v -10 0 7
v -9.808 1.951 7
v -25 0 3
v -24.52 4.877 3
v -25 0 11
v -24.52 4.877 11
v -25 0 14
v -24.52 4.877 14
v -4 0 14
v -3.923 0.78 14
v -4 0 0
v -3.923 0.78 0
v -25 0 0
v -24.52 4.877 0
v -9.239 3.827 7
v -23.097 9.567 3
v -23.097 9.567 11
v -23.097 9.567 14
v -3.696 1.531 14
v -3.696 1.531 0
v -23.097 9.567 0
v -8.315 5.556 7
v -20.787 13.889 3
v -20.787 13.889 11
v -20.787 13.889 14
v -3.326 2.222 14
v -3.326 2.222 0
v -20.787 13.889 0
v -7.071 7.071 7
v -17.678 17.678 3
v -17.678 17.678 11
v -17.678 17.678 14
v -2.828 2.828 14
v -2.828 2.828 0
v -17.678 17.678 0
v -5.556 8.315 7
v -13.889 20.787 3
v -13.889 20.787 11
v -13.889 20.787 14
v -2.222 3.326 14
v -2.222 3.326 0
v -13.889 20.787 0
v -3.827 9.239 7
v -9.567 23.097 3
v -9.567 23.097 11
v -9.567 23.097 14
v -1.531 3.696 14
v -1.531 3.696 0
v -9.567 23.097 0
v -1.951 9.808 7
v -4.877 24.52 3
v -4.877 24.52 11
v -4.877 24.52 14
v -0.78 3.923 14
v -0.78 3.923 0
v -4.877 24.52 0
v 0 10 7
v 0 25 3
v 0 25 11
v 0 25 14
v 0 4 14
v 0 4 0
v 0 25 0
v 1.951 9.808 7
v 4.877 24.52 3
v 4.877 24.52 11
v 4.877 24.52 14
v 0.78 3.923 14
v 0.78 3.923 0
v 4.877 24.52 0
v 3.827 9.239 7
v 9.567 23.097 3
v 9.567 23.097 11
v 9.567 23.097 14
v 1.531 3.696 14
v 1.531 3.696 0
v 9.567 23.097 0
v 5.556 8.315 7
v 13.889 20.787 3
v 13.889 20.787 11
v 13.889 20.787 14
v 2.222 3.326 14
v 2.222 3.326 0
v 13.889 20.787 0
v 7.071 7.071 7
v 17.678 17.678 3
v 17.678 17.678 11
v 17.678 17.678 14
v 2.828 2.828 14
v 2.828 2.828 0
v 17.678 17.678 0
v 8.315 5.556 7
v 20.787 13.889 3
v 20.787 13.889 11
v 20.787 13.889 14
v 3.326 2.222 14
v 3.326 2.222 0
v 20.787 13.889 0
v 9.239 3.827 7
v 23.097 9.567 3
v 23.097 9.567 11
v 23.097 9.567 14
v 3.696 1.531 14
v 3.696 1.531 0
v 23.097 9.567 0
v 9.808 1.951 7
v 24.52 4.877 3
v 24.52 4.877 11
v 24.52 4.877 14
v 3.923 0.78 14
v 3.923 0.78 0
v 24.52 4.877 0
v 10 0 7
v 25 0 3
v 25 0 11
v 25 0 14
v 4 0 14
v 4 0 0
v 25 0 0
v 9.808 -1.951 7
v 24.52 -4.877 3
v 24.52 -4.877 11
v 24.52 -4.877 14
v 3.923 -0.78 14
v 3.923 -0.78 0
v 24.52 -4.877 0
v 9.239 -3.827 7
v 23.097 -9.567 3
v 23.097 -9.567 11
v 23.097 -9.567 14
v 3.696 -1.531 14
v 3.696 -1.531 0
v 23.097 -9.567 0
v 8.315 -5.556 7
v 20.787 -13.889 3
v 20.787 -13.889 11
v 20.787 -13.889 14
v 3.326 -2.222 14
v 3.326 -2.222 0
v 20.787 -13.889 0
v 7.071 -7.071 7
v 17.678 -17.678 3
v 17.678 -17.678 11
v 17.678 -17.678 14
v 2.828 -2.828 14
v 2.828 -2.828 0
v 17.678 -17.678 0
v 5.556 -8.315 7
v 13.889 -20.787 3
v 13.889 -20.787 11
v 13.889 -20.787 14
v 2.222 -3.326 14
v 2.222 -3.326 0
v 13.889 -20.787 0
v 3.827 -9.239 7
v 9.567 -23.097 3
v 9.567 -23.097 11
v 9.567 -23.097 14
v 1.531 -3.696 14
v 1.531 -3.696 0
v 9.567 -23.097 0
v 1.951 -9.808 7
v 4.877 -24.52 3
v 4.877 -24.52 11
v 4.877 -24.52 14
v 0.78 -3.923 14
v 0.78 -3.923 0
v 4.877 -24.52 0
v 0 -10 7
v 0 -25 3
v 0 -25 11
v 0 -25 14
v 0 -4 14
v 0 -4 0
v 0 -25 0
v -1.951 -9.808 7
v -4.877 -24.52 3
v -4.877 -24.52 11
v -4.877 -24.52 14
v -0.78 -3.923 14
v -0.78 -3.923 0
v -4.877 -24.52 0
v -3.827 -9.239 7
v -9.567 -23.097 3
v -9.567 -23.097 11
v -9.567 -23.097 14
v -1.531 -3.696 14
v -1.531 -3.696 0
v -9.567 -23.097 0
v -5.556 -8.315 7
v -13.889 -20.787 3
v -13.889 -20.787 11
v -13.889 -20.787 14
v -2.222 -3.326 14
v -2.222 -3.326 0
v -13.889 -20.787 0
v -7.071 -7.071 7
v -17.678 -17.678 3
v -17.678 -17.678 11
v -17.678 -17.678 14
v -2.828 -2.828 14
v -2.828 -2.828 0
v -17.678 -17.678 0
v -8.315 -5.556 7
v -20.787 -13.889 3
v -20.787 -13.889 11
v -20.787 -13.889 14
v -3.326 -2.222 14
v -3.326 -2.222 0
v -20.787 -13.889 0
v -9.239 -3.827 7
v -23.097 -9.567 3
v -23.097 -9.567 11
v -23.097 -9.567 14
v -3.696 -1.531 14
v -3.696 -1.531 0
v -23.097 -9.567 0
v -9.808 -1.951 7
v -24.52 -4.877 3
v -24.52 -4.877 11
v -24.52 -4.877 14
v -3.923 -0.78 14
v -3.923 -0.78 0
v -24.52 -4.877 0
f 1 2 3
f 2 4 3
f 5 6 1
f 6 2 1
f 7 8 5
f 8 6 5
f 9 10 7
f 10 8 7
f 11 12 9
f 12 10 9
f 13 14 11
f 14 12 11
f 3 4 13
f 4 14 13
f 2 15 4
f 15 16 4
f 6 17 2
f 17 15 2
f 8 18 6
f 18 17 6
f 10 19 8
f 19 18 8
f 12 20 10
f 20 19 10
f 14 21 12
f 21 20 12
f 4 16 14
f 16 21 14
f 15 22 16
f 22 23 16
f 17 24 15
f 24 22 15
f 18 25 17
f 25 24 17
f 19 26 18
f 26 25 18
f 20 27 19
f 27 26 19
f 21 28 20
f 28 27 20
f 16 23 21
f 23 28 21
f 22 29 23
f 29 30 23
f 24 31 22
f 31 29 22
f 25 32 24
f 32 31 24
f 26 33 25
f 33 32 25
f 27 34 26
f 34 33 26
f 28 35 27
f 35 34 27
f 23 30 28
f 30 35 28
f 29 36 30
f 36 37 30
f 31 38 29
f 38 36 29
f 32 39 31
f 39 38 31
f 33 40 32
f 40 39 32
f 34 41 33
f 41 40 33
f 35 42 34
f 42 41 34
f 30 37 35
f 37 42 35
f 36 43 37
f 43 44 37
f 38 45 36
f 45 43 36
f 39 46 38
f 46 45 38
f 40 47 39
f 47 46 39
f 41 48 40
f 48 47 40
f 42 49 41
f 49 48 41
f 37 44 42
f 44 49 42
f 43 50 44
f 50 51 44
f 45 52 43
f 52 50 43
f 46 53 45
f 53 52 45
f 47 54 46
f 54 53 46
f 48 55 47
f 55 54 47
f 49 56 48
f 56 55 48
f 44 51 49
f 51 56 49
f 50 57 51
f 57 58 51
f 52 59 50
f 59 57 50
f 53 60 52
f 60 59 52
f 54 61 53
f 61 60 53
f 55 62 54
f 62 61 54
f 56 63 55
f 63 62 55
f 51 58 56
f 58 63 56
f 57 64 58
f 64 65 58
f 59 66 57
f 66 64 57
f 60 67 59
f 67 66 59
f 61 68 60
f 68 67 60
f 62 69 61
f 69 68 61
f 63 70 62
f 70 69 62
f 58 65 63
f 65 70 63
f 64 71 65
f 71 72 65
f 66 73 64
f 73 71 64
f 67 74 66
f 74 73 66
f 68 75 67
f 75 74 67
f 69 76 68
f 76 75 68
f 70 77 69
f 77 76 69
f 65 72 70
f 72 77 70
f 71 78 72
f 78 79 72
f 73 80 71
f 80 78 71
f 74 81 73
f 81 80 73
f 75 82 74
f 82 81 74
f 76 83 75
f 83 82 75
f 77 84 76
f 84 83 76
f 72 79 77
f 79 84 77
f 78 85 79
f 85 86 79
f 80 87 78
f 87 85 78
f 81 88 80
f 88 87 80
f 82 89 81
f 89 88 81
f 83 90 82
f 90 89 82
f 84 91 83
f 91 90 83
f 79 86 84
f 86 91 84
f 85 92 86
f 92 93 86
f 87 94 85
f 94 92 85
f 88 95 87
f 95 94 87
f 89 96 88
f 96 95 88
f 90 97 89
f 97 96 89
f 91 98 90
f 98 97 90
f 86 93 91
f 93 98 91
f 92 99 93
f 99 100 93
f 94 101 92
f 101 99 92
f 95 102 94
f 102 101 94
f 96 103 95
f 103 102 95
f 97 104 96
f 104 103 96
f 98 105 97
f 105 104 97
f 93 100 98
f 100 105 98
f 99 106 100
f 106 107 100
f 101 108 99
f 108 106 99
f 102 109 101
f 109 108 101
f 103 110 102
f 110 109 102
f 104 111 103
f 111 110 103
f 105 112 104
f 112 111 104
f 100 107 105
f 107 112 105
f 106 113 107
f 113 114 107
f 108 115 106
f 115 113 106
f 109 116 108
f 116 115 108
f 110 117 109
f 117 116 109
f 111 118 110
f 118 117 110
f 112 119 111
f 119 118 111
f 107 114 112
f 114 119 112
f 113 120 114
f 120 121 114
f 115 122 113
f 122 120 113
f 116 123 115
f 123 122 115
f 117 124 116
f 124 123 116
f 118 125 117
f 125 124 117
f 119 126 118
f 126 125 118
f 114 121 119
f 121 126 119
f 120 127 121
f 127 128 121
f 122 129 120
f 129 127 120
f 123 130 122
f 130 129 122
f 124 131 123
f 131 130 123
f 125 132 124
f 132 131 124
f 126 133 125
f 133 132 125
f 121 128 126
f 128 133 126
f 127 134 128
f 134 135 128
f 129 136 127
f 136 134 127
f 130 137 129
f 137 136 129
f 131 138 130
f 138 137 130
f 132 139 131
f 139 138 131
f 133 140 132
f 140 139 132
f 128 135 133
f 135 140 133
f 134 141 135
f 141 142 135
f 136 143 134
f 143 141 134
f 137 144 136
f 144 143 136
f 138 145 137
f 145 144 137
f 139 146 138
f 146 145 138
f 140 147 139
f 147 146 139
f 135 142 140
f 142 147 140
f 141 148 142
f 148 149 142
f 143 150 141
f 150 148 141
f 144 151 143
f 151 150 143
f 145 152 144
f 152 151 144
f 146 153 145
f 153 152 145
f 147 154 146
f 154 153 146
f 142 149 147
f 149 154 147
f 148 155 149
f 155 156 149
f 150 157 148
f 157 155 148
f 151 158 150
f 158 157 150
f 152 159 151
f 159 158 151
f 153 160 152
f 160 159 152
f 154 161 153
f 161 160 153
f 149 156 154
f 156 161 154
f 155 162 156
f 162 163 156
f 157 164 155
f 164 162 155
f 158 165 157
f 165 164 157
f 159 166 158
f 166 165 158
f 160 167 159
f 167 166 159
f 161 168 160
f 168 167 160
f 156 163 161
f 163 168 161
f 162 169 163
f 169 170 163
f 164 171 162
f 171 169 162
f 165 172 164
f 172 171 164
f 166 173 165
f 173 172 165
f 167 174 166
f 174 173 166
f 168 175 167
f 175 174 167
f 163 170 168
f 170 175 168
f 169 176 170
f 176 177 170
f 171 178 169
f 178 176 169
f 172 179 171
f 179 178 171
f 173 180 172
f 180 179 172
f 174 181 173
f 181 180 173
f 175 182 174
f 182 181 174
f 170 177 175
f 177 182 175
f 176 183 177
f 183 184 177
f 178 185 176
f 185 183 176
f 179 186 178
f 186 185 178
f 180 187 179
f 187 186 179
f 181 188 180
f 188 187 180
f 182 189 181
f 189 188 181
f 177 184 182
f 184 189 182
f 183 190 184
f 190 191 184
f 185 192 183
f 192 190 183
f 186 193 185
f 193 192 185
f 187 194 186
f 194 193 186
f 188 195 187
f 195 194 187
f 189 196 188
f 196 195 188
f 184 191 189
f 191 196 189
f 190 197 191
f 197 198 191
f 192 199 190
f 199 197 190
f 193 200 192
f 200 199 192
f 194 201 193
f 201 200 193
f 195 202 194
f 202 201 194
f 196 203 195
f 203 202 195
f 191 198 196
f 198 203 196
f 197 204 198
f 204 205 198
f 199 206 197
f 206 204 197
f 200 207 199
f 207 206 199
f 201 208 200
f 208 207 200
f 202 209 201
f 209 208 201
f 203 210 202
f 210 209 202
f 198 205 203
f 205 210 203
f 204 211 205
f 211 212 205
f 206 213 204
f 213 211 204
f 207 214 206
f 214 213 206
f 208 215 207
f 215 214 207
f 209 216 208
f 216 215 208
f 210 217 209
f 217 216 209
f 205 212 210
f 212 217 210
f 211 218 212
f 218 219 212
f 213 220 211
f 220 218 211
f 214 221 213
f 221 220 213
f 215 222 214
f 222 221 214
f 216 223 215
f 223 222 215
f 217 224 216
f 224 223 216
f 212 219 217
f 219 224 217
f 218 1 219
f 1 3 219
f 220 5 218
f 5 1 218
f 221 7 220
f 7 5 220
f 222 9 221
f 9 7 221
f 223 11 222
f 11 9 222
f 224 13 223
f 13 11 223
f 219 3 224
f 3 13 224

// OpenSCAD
$fn = 32;

// ----------------------------------------------------------------------
// Revolved part: V-groove pulley R25
// ----------------------------------------------------------------------

// --- parameters (mm) ---
bore_r = 4;               // bore radius
rim_r = 25;               // rim radius
rim_t = 14;               // rim width
groove_r = 10;            // groove root radius
groove_w = 4;             // groove half width
revolve_angle = 360;      // revolve sweep, degrees

bore_d = 2 * bore_r;
rim_d = 2 * rim_r;
groove_d = 2 * groove_r;

profile = [[4, 0], [25, 0], [25, 3], [10, 7], [25, 11], [25, 14], [4, 14]];  // primary outline, 7 points, counter clockwise

// --- the one profile operation ---
rotate_extrude(angle = revolve_angle) polygon(points = profile);
